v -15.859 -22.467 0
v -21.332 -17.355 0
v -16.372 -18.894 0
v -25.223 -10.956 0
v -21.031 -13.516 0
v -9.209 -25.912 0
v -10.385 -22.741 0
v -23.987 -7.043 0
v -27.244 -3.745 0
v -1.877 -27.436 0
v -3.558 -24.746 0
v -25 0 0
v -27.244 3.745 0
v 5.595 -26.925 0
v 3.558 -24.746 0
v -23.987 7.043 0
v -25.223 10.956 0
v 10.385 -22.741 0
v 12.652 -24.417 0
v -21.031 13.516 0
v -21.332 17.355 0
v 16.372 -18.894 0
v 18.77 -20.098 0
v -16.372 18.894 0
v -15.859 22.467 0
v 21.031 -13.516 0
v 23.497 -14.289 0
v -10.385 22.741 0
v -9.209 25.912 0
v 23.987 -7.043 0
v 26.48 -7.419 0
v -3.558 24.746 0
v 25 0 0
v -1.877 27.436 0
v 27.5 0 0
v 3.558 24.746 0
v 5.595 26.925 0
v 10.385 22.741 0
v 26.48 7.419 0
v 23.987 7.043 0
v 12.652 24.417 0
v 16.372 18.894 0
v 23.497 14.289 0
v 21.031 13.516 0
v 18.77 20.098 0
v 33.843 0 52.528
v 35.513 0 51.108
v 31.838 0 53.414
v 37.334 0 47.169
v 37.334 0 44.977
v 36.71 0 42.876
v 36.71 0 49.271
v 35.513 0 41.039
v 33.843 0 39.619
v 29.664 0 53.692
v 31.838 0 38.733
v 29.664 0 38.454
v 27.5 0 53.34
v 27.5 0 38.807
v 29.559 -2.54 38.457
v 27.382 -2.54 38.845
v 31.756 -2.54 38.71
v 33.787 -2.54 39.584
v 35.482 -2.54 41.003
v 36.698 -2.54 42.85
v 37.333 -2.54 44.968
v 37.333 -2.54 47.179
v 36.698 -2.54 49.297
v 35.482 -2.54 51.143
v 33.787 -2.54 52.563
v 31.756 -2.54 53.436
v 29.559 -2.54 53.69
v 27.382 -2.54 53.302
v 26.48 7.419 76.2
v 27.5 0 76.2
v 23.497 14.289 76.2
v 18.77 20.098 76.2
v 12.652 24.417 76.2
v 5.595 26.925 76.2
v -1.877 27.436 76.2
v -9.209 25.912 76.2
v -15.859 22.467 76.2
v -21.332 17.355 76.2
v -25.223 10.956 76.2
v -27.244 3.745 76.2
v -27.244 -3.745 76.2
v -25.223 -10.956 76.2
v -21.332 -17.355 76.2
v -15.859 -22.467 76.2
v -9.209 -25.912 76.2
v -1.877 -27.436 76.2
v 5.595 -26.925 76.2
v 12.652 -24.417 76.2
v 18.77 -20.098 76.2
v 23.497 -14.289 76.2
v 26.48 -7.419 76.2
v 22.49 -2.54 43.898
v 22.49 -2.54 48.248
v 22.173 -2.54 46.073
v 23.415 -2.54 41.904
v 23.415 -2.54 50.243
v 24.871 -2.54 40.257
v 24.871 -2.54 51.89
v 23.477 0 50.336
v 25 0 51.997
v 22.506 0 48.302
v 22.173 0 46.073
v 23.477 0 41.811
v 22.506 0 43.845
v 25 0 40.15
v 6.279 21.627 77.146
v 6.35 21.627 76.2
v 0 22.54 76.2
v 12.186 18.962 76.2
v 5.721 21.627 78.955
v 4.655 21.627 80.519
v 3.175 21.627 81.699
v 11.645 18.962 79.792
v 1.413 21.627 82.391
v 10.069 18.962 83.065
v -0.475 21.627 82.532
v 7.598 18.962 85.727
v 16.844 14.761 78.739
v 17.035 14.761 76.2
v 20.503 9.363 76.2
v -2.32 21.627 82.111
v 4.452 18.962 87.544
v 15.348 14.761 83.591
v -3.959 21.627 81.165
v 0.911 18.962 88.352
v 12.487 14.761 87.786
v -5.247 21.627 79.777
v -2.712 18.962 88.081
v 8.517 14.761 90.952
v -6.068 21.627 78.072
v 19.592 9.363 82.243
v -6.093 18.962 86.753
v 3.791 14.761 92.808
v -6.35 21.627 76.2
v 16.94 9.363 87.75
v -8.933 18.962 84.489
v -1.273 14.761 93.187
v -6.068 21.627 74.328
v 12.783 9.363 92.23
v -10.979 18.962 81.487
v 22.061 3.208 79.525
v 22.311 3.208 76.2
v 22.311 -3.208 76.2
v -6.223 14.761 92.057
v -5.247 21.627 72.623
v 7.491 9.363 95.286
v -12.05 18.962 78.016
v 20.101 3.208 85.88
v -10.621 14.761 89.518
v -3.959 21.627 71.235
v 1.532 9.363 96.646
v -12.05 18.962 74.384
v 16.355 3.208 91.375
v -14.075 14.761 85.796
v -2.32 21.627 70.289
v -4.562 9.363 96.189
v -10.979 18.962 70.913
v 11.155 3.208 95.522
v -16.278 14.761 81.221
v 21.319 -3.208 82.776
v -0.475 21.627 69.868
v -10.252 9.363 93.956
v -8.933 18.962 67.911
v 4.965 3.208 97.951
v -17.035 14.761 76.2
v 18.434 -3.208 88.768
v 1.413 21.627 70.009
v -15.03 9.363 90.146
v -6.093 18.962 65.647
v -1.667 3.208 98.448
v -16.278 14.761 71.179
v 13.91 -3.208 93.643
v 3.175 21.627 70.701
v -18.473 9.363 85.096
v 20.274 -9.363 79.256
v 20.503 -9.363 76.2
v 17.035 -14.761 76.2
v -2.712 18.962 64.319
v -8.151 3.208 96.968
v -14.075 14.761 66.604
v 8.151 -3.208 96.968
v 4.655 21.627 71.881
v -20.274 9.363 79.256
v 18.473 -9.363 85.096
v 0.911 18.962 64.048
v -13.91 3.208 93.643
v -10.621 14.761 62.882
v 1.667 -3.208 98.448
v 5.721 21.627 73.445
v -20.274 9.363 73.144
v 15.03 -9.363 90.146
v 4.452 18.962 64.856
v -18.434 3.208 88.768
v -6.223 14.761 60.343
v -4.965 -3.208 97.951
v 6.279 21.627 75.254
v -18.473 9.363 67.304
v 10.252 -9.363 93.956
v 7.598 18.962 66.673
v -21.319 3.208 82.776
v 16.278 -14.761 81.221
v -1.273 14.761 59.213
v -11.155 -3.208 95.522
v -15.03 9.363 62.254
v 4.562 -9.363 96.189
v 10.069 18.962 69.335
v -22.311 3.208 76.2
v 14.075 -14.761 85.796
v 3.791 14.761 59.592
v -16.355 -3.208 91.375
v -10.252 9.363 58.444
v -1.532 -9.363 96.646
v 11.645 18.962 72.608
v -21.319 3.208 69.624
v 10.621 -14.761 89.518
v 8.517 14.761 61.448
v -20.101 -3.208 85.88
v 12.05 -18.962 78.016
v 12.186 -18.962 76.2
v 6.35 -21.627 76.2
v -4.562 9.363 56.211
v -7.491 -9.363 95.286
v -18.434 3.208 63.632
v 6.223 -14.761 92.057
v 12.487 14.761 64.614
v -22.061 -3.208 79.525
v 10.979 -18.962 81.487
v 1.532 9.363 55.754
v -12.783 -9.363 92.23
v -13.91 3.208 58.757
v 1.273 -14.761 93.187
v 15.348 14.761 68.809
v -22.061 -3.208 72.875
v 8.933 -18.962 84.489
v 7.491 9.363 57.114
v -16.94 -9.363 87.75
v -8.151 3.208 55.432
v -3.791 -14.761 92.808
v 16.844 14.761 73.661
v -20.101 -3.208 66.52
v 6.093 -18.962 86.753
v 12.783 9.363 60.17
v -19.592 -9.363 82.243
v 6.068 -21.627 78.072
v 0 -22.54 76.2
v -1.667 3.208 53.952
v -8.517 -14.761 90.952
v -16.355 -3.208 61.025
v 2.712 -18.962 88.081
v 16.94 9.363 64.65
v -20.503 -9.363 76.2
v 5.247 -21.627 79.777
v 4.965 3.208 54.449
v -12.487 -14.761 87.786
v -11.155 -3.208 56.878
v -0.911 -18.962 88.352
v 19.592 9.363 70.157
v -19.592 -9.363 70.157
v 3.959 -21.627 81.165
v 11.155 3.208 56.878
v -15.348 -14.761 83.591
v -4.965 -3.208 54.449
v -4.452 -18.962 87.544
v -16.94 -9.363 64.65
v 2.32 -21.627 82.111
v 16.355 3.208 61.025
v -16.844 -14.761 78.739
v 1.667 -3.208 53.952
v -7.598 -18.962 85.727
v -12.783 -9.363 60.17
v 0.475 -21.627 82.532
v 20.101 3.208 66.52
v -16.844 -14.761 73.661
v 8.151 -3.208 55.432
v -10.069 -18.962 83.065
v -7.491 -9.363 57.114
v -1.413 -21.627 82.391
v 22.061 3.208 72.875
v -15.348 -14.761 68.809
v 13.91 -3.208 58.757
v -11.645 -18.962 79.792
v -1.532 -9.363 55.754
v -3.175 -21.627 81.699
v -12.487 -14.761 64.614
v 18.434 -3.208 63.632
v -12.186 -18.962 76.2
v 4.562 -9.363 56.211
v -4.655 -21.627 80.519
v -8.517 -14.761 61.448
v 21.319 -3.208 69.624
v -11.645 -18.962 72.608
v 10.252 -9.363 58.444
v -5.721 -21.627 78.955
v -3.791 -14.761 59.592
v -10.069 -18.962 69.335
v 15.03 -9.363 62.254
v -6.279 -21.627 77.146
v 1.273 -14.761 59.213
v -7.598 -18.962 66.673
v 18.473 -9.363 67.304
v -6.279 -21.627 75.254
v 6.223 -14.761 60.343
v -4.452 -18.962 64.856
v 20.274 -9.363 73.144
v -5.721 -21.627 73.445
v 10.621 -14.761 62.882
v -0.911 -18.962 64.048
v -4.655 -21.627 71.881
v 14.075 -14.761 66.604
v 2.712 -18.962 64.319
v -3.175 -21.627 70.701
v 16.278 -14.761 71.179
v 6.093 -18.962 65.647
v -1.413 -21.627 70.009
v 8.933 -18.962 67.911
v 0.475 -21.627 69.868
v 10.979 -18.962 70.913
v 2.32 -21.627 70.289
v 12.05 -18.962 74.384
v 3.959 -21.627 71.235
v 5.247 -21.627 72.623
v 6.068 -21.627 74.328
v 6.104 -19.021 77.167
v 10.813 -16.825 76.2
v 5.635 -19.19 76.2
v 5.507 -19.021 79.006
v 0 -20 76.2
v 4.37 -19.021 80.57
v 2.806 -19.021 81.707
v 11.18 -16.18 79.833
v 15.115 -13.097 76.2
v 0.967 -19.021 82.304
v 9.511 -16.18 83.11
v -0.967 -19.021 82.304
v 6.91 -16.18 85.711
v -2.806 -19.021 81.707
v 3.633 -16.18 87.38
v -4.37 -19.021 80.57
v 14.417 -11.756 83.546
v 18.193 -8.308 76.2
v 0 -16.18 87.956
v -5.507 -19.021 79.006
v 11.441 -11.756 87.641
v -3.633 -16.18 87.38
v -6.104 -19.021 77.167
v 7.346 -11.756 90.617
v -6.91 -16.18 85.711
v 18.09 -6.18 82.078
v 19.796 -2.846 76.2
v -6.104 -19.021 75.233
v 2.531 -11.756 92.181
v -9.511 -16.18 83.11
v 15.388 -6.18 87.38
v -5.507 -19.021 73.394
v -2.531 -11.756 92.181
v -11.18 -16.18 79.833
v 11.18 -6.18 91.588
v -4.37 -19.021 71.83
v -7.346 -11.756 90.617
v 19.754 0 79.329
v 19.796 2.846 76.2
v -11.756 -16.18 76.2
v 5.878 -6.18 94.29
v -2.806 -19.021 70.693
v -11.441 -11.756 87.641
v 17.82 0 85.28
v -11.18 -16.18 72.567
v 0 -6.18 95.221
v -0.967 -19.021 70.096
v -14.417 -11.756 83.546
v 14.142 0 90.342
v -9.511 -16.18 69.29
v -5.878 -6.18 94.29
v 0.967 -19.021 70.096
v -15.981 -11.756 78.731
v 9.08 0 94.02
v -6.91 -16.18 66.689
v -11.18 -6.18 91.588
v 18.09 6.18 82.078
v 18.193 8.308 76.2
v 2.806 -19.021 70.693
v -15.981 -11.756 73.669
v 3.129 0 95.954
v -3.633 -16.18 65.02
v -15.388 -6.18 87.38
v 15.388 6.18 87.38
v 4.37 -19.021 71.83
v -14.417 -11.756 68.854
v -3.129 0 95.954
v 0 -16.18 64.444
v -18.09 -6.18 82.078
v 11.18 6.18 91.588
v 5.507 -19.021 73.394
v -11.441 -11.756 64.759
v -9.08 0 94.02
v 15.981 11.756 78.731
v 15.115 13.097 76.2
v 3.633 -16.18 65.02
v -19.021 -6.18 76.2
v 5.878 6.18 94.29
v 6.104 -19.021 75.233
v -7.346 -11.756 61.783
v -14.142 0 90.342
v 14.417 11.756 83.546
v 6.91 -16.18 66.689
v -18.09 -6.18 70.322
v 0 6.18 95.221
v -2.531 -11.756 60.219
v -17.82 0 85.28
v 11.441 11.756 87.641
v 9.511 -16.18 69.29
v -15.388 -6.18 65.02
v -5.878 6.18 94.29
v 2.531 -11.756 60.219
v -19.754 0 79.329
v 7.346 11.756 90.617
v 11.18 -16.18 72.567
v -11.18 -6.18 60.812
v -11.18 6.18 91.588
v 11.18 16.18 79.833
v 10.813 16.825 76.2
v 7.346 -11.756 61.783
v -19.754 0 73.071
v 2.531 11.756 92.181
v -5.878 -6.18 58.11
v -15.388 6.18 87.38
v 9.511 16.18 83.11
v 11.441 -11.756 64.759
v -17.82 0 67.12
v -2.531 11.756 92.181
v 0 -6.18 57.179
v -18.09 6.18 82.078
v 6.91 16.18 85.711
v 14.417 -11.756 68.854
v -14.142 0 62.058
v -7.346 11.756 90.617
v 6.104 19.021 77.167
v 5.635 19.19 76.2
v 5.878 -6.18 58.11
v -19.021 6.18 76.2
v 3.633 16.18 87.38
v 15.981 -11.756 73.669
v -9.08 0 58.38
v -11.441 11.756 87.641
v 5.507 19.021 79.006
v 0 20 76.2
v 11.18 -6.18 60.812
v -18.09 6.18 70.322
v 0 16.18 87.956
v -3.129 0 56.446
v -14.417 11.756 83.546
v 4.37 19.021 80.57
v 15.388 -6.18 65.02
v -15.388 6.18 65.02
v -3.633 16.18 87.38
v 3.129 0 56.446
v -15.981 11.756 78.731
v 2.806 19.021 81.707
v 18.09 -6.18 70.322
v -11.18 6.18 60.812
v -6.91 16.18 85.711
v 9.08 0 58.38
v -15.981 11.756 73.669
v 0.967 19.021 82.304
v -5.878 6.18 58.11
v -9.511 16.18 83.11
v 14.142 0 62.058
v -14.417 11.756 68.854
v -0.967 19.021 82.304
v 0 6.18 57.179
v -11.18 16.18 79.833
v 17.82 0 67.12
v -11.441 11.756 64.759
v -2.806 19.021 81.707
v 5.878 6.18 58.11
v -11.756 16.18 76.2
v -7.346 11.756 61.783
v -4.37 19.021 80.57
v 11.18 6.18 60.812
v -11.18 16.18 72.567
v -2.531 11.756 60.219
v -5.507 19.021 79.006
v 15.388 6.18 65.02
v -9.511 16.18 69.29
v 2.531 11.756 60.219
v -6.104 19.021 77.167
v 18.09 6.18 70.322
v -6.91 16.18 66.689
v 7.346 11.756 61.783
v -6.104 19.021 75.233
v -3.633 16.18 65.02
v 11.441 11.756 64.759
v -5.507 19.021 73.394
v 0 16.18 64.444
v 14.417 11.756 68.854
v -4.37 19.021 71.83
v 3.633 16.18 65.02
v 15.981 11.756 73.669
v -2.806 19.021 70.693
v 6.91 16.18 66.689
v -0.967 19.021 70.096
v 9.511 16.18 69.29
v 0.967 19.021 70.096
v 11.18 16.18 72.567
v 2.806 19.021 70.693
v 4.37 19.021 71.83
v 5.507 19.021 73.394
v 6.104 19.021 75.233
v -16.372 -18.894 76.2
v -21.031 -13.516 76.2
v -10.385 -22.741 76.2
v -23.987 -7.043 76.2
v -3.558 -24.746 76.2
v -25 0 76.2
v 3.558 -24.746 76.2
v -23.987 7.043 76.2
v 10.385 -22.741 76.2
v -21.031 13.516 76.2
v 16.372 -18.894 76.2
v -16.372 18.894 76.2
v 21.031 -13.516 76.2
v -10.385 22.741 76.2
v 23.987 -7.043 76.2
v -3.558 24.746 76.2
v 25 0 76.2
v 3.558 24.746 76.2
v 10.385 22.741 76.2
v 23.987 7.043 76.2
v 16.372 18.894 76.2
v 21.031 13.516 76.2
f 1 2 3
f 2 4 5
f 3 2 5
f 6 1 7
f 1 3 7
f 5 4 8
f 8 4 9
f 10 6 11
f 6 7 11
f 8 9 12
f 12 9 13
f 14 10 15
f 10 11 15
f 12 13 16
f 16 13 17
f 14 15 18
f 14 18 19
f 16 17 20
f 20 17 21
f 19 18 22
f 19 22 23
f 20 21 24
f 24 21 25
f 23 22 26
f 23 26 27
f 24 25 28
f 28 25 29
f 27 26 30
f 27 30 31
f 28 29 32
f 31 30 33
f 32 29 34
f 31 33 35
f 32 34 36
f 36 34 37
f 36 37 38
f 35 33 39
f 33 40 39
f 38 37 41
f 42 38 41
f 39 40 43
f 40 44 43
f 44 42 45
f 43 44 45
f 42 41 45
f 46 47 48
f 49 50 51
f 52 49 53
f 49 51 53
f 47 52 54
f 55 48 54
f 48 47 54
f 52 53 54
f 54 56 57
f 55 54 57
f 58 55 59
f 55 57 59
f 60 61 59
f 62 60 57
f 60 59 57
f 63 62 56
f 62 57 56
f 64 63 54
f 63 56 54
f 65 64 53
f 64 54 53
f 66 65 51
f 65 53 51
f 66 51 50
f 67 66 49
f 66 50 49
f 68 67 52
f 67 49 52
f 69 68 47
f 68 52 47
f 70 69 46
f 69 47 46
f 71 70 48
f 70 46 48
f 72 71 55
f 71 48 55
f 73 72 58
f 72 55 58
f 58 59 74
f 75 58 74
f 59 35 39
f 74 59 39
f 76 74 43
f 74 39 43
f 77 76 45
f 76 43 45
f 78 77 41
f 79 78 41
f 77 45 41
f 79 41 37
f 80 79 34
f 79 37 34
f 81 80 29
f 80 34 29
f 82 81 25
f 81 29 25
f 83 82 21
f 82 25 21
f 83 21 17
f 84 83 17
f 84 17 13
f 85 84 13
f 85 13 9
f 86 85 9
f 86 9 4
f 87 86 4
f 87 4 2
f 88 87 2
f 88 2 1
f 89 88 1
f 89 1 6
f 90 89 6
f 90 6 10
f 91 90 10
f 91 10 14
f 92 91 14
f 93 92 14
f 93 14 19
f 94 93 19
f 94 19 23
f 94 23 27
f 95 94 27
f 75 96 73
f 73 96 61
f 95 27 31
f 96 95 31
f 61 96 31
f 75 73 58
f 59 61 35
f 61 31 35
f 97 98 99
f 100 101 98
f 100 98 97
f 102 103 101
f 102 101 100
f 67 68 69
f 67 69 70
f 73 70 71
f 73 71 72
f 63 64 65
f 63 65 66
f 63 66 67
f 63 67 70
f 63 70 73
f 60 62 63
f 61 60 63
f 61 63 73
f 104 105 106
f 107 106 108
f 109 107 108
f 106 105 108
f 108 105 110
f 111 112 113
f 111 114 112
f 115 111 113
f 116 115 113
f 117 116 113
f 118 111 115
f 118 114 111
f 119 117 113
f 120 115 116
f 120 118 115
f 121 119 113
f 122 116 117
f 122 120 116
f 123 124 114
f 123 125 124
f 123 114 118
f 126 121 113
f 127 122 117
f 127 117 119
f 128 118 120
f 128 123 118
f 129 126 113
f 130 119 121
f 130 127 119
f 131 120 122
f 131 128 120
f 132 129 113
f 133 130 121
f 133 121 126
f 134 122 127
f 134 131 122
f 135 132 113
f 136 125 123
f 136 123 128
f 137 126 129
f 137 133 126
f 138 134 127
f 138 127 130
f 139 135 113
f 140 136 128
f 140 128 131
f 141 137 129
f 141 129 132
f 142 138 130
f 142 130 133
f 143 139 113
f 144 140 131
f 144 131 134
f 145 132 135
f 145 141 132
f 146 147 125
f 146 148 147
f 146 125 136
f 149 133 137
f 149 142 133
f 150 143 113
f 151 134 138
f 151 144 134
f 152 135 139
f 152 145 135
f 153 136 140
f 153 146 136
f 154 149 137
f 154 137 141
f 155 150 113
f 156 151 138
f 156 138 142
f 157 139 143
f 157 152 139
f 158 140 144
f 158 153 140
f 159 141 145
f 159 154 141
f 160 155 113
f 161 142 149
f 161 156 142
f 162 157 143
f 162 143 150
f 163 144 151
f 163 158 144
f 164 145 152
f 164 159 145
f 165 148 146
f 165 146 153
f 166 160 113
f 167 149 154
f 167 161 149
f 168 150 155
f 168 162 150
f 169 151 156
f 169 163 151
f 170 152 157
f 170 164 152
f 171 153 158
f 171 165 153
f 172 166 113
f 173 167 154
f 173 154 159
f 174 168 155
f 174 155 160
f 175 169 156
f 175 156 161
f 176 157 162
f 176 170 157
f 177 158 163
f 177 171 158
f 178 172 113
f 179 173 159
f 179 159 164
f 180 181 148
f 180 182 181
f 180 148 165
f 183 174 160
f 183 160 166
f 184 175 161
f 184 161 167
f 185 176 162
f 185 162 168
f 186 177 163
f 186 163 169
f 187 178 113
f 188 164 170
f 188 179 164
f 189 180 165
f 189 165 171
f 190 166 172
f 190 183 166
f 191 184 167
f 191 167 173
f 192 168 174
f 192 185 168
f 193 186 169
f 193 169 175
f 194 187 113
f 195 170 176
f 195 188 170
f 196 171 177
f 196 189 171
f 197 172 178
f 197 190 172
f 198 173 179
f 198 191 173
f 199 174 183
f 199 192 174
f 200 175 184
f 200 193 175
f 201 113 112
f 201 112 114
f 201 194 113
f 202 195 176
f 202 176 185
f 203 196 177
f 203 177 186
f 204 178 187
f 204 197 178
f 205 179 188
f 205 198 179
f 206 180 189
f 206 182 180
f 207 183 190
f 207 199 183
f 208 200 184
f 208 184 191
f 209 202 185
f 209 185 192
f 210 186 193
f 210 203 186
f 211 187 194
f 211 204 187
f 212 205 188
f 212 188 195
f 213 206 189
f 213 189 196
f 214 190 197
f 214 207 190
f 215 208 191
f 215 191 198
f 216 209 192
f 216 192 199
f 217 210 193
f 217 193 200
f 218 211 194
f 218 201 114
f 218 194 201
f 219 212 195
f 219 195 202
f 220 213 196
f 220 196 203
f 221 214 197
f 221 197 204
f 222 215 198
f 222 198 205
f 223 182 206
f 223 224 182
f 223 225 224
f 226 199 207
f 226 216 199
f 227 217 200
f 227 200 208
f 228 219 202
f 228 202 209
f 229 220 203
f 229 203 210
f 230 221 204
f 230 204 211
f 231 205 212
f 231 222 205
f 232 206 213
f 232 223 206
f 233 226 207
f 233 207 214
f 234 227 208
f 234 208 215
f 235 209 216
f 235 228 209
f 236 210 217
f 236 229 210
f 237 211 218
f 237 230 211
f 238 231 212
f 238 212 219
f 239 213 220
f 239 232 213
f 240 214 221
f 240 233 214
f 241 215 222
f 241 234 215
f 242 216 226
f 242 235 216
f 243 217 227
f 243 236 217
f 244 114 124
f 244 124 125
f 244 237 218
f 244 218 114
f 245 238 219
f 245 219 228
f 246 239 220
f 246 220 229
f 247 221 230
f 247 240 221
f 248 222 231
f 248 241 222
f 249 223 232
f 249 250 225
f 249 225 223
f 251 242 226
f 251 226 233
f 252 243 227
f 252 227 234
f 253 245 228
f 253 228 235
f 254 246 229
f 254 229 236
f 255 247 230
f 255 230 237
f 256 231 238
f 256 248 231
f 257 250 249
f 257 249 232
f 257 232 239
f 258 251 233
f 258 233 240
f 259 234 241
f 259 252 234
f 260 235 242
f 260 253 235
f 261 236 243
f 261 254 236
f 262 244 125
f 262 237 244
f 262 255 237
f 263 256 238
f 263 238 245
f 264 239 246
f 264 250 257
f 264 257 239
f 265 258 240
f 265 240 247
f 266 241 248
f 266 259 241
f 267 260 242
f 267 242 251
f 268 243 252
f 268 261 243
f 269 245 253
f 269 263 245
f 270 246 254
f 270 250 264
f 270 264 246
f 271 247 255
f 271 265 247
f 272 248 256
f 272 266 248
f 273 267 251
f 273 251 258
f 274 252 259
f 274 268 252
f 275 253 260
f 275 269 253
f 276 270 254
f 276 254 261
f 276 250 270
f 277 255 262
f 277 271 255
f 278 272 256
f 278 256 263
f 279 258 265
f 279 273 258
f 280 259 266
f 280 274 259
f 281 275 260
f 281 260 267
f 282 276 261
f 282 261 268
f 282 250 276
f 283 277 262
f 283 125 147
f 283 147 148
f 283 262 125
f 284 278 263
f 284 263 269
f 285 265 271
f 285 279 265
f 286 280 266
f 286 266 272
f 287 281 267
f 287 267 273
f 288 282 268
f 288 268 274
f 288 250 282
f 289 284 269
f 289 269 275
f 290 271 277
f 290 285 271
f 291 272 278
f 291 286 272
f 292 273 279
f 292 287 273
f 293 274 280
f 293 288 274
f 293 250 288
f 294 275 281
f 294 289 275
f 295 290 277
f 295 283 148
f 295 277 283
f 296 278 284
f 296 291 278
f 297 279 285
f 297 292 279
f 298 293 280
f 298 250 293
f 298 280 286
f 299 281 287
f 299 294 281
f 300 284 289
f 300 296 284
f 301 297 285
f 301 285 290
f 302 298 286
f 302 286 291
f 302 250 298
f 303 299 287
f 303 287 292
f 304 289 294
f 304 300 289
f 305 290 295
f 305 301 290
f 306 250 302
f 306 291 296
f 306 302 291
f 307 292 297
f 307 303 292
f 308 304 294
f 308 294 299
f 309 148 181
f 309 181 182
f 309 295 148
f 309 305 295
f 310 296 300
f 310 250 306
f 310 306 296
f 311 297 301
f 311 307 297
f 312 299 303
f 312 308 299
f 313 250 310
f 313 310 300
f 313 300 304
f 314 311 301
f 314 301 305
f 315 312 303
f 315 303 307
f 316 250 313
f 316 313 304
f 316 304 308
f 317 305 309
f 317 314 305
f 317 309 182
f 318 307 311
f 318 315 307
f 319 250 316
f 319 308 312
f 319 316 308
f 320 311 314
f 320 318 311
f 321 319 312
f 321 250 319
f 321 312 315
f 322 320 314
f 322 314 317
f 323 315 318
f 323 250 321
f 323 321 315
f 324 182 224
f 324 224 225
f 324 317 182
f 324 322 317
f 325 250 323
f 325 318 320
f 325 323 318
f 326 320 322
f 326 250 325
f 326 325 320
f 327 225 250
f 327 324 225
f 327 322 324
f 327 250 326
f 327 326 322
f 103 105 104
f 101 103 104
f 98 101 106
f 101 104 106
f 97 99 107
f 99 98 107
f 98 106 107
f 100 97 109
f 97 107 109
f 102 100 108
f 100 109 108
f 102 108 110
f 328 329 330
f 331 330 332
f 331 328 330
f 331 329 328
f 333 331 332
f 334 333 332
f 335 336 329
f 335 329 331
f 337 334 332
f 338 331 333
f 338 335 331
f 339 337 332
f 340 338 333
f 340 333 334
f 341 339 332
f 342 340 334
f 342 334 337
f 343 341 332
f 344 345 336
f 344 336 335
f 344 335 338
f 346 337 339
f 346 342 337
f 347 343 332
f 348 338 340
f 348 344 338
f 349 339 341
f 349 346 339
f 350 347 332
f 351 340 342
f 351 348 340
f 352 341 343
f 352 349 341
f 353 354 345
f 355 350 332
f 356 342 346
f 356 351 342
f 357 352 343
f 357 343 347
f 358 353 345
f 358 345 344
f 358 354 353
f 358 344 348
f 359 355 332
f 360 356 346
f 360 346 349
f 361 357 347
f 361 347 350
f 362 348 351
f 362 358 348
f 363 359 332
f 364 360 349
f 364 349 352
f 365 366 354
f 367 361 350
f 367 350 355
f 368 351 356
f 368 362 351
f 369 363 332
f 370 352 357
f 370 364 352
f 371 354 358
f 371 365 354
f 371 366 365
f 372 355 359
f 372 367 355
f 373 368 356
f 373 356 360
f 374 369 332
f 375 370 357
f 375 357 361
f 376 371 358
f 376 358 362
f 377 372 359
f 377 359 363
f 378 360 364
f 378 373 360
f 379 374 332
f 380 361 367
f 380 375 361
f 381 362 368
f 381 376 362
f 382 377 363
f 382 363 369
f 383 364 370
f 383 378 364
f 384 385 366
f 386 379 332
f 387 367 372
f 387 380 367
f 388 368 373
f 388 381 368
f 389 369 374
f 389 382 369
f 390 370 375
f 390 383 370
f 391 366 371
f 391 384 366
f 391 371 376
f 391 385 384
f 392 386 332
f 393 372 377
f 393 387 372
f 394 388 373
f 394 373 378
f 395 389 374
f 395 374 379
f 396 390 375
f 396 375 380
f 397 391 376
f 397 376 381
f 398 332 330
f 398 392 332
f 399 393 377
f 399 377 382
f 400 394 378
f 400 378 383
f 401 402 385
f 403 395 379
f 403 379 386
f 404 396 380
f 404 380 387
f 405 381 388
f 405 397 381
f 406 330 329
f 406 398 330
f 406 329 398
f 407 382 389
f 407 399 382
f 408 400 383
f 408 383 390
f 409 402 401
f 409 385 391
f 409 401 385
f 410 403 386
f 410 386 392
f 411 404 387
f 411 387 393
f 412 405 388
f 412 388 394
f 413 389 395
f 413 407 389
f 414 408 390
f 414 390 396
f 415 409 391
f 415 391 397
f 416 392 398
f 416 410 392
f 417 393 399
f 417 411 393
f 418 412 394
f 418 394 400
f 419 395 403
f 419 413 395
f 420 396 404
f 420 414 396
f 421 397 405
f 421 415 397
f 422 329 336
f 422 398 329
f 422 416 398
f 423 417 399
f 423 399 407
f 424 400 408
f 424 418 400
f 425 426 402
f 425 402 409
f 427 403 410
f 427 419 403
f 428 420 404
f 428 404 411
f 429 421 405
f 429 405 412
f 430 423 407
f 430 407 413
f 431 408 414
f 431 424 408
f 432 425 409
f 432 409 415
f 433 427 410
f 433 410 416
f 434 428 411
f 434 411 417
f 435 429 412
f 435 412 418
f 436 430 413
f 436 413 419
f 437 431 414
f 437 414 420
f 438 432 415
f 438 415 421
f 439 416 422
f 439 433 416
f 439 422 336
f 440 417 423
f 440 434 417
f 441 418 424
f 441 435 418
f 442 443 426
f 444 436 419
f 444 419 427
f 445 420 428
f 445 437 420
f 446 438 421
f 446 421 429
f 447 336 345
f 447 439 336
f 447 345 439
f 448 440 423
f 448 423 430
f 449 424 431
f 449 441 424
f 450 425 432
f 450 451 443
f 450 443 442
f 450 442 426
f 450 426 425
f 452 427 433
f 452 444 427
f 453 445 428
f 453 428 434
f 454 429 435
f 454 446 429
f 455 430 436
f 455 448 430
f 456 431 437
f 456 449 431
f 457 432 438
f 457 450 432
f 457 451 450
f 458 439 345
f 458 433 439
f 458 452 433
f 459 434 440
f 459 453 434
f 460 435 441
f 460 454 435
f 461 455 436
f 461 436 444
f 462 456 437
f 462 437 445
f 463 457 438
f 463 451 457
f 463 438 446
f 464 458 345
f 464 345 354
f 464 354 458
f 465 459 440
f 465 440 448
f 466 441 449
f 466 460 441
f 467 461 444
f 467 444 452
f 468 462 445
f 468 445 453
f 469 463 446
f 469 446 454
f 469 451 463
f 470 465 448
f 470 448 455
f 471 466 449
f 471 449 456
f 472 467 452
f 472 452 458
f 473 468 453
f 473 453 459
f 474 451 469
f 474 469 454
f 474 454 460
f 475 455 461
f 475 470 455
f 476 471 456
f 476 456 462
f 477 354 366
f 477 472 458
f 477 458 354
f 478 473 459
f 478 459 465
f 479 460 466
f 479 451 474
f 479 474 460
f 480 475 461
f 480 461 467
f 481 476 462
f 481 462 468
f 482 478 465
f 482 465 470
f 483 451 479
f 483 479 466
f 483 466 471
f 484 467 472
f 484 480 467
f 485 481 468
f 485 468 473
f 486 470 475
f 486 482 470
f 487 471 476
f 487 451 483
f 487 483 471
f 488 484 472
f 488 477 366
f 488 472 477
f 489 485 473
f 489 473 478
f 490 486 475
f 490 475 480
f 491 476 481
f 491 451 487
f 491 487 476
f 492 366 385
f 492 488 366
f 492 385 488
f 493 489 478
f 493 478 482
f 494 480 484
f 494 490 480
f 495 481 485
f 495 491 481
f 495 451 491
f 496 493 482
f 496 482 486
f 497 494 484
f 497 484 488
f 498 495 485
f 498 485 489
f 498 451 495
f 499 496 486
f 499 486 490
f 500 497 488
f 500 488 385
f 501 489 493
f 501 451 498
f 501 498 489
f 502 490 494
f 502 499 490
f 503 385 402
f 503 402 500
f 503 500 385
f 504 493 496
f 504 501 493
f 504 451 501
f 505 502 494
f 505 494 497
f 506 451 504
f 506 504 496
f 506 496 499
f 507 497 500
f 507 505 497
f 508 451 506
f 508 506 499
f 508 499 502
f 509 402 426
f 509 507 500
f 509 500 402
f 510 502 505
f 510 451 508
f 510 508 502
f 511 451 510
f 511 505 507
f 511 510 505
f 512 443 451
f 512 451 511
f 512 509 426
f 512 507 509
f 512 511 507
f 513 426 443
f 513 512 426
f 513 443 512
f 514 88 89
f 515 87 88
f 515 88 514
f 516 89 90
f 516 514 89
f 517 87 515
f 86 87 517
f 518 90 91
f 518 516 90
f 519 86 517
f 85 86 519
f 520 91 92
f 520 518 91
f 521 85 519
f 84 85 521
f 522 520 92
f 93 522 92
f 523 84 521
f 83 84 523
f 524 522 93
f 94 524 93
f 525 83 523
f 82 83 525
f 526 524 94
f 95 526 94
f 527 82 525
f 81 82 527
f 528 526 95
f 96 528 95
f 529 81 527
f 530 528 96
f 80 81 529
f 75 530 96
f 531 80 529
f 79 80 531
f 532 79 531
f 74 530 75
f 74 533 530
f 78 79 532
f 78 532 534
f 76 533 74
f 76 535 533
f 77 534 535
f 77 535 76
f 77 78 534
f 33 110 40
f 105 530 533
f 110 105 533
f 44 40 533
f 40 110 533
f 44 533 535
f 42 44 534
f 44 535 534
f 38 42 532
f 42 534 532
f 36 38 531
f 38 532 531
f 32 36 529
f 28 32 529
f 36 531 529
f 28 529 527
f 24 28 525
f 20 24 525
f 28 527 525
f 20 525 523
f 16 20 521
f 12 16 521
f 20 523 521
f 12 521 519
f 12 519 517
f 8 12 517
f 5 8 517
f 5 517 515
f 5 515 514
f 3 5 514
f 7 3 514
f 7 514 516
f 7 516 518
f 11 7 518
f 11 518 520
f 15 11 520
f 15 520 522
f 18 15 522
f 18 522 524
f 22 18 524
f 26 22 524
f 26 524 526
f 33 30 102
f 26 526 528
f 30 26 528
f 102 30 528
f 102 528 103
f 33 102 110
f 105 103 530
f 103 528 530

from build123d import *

# Parameters (mm, degrees)
SKETCH1_R           = 27.5
BOSS_EXTRUDE1_DEPTH = 76.2
SKETCH2_R           = 25
CUT_EXTRUDE1_DEPTH  = 76.2
SKETCH6_R           = 7.62
BOSS_EXTRUDE3_DEPTH = 2.54


with BuildPart() as part:
    # Sketch1 → Boss-Extrude1 (new body)
    with BuildSketch(Plane.XY):
        Circle(SKETCH1_R)
    extrude(amount=BOSS_EXTRUDE1_DEPTH)

    # Sketch2 → Cut-Extrude1 (cut)
    with BuildSketch(Plane.XY.offset(76.2)):
        Circle(SKETCH2_R)
    extrude(amount=-CUT_EXTRUDE1_DEPTH, mode=Mode.SUBTRACT)

    # Sketch6 → Boss-Extrude3 (add)
    with BuildSketch(Plane(origin=(0, 0, 0), x_dir=(-1, 0, 0), z_dir=(0, -1, 0))):
        with Locations((-29.793262581, -46.07327125)):
            Circle(SKETCH6_R)
    extrude(amount=BOSS_EXTRUDE3_DEPTH)


with BuildPart() as body_2:
    # Sketch3 → Revolve-Thin1 (revolve)
    with BuildSketch(Plane.XY.offset(76.2)):
        with BuildLine():
            ThreePointArc((0, -20), (20, 0), (0, 20))
            Line((0, 20), (0, 22.54))
            ThreePointArc((0, 22.54), (22.54, 0), (0, -22.54))
            Line((0, -22.54), (0, -20))
        make_face()
    revolve(axis=Axis((0, 27.5, 76.2), (0, -1, 0)))


solid = Compound([part.part, body_2.part])
